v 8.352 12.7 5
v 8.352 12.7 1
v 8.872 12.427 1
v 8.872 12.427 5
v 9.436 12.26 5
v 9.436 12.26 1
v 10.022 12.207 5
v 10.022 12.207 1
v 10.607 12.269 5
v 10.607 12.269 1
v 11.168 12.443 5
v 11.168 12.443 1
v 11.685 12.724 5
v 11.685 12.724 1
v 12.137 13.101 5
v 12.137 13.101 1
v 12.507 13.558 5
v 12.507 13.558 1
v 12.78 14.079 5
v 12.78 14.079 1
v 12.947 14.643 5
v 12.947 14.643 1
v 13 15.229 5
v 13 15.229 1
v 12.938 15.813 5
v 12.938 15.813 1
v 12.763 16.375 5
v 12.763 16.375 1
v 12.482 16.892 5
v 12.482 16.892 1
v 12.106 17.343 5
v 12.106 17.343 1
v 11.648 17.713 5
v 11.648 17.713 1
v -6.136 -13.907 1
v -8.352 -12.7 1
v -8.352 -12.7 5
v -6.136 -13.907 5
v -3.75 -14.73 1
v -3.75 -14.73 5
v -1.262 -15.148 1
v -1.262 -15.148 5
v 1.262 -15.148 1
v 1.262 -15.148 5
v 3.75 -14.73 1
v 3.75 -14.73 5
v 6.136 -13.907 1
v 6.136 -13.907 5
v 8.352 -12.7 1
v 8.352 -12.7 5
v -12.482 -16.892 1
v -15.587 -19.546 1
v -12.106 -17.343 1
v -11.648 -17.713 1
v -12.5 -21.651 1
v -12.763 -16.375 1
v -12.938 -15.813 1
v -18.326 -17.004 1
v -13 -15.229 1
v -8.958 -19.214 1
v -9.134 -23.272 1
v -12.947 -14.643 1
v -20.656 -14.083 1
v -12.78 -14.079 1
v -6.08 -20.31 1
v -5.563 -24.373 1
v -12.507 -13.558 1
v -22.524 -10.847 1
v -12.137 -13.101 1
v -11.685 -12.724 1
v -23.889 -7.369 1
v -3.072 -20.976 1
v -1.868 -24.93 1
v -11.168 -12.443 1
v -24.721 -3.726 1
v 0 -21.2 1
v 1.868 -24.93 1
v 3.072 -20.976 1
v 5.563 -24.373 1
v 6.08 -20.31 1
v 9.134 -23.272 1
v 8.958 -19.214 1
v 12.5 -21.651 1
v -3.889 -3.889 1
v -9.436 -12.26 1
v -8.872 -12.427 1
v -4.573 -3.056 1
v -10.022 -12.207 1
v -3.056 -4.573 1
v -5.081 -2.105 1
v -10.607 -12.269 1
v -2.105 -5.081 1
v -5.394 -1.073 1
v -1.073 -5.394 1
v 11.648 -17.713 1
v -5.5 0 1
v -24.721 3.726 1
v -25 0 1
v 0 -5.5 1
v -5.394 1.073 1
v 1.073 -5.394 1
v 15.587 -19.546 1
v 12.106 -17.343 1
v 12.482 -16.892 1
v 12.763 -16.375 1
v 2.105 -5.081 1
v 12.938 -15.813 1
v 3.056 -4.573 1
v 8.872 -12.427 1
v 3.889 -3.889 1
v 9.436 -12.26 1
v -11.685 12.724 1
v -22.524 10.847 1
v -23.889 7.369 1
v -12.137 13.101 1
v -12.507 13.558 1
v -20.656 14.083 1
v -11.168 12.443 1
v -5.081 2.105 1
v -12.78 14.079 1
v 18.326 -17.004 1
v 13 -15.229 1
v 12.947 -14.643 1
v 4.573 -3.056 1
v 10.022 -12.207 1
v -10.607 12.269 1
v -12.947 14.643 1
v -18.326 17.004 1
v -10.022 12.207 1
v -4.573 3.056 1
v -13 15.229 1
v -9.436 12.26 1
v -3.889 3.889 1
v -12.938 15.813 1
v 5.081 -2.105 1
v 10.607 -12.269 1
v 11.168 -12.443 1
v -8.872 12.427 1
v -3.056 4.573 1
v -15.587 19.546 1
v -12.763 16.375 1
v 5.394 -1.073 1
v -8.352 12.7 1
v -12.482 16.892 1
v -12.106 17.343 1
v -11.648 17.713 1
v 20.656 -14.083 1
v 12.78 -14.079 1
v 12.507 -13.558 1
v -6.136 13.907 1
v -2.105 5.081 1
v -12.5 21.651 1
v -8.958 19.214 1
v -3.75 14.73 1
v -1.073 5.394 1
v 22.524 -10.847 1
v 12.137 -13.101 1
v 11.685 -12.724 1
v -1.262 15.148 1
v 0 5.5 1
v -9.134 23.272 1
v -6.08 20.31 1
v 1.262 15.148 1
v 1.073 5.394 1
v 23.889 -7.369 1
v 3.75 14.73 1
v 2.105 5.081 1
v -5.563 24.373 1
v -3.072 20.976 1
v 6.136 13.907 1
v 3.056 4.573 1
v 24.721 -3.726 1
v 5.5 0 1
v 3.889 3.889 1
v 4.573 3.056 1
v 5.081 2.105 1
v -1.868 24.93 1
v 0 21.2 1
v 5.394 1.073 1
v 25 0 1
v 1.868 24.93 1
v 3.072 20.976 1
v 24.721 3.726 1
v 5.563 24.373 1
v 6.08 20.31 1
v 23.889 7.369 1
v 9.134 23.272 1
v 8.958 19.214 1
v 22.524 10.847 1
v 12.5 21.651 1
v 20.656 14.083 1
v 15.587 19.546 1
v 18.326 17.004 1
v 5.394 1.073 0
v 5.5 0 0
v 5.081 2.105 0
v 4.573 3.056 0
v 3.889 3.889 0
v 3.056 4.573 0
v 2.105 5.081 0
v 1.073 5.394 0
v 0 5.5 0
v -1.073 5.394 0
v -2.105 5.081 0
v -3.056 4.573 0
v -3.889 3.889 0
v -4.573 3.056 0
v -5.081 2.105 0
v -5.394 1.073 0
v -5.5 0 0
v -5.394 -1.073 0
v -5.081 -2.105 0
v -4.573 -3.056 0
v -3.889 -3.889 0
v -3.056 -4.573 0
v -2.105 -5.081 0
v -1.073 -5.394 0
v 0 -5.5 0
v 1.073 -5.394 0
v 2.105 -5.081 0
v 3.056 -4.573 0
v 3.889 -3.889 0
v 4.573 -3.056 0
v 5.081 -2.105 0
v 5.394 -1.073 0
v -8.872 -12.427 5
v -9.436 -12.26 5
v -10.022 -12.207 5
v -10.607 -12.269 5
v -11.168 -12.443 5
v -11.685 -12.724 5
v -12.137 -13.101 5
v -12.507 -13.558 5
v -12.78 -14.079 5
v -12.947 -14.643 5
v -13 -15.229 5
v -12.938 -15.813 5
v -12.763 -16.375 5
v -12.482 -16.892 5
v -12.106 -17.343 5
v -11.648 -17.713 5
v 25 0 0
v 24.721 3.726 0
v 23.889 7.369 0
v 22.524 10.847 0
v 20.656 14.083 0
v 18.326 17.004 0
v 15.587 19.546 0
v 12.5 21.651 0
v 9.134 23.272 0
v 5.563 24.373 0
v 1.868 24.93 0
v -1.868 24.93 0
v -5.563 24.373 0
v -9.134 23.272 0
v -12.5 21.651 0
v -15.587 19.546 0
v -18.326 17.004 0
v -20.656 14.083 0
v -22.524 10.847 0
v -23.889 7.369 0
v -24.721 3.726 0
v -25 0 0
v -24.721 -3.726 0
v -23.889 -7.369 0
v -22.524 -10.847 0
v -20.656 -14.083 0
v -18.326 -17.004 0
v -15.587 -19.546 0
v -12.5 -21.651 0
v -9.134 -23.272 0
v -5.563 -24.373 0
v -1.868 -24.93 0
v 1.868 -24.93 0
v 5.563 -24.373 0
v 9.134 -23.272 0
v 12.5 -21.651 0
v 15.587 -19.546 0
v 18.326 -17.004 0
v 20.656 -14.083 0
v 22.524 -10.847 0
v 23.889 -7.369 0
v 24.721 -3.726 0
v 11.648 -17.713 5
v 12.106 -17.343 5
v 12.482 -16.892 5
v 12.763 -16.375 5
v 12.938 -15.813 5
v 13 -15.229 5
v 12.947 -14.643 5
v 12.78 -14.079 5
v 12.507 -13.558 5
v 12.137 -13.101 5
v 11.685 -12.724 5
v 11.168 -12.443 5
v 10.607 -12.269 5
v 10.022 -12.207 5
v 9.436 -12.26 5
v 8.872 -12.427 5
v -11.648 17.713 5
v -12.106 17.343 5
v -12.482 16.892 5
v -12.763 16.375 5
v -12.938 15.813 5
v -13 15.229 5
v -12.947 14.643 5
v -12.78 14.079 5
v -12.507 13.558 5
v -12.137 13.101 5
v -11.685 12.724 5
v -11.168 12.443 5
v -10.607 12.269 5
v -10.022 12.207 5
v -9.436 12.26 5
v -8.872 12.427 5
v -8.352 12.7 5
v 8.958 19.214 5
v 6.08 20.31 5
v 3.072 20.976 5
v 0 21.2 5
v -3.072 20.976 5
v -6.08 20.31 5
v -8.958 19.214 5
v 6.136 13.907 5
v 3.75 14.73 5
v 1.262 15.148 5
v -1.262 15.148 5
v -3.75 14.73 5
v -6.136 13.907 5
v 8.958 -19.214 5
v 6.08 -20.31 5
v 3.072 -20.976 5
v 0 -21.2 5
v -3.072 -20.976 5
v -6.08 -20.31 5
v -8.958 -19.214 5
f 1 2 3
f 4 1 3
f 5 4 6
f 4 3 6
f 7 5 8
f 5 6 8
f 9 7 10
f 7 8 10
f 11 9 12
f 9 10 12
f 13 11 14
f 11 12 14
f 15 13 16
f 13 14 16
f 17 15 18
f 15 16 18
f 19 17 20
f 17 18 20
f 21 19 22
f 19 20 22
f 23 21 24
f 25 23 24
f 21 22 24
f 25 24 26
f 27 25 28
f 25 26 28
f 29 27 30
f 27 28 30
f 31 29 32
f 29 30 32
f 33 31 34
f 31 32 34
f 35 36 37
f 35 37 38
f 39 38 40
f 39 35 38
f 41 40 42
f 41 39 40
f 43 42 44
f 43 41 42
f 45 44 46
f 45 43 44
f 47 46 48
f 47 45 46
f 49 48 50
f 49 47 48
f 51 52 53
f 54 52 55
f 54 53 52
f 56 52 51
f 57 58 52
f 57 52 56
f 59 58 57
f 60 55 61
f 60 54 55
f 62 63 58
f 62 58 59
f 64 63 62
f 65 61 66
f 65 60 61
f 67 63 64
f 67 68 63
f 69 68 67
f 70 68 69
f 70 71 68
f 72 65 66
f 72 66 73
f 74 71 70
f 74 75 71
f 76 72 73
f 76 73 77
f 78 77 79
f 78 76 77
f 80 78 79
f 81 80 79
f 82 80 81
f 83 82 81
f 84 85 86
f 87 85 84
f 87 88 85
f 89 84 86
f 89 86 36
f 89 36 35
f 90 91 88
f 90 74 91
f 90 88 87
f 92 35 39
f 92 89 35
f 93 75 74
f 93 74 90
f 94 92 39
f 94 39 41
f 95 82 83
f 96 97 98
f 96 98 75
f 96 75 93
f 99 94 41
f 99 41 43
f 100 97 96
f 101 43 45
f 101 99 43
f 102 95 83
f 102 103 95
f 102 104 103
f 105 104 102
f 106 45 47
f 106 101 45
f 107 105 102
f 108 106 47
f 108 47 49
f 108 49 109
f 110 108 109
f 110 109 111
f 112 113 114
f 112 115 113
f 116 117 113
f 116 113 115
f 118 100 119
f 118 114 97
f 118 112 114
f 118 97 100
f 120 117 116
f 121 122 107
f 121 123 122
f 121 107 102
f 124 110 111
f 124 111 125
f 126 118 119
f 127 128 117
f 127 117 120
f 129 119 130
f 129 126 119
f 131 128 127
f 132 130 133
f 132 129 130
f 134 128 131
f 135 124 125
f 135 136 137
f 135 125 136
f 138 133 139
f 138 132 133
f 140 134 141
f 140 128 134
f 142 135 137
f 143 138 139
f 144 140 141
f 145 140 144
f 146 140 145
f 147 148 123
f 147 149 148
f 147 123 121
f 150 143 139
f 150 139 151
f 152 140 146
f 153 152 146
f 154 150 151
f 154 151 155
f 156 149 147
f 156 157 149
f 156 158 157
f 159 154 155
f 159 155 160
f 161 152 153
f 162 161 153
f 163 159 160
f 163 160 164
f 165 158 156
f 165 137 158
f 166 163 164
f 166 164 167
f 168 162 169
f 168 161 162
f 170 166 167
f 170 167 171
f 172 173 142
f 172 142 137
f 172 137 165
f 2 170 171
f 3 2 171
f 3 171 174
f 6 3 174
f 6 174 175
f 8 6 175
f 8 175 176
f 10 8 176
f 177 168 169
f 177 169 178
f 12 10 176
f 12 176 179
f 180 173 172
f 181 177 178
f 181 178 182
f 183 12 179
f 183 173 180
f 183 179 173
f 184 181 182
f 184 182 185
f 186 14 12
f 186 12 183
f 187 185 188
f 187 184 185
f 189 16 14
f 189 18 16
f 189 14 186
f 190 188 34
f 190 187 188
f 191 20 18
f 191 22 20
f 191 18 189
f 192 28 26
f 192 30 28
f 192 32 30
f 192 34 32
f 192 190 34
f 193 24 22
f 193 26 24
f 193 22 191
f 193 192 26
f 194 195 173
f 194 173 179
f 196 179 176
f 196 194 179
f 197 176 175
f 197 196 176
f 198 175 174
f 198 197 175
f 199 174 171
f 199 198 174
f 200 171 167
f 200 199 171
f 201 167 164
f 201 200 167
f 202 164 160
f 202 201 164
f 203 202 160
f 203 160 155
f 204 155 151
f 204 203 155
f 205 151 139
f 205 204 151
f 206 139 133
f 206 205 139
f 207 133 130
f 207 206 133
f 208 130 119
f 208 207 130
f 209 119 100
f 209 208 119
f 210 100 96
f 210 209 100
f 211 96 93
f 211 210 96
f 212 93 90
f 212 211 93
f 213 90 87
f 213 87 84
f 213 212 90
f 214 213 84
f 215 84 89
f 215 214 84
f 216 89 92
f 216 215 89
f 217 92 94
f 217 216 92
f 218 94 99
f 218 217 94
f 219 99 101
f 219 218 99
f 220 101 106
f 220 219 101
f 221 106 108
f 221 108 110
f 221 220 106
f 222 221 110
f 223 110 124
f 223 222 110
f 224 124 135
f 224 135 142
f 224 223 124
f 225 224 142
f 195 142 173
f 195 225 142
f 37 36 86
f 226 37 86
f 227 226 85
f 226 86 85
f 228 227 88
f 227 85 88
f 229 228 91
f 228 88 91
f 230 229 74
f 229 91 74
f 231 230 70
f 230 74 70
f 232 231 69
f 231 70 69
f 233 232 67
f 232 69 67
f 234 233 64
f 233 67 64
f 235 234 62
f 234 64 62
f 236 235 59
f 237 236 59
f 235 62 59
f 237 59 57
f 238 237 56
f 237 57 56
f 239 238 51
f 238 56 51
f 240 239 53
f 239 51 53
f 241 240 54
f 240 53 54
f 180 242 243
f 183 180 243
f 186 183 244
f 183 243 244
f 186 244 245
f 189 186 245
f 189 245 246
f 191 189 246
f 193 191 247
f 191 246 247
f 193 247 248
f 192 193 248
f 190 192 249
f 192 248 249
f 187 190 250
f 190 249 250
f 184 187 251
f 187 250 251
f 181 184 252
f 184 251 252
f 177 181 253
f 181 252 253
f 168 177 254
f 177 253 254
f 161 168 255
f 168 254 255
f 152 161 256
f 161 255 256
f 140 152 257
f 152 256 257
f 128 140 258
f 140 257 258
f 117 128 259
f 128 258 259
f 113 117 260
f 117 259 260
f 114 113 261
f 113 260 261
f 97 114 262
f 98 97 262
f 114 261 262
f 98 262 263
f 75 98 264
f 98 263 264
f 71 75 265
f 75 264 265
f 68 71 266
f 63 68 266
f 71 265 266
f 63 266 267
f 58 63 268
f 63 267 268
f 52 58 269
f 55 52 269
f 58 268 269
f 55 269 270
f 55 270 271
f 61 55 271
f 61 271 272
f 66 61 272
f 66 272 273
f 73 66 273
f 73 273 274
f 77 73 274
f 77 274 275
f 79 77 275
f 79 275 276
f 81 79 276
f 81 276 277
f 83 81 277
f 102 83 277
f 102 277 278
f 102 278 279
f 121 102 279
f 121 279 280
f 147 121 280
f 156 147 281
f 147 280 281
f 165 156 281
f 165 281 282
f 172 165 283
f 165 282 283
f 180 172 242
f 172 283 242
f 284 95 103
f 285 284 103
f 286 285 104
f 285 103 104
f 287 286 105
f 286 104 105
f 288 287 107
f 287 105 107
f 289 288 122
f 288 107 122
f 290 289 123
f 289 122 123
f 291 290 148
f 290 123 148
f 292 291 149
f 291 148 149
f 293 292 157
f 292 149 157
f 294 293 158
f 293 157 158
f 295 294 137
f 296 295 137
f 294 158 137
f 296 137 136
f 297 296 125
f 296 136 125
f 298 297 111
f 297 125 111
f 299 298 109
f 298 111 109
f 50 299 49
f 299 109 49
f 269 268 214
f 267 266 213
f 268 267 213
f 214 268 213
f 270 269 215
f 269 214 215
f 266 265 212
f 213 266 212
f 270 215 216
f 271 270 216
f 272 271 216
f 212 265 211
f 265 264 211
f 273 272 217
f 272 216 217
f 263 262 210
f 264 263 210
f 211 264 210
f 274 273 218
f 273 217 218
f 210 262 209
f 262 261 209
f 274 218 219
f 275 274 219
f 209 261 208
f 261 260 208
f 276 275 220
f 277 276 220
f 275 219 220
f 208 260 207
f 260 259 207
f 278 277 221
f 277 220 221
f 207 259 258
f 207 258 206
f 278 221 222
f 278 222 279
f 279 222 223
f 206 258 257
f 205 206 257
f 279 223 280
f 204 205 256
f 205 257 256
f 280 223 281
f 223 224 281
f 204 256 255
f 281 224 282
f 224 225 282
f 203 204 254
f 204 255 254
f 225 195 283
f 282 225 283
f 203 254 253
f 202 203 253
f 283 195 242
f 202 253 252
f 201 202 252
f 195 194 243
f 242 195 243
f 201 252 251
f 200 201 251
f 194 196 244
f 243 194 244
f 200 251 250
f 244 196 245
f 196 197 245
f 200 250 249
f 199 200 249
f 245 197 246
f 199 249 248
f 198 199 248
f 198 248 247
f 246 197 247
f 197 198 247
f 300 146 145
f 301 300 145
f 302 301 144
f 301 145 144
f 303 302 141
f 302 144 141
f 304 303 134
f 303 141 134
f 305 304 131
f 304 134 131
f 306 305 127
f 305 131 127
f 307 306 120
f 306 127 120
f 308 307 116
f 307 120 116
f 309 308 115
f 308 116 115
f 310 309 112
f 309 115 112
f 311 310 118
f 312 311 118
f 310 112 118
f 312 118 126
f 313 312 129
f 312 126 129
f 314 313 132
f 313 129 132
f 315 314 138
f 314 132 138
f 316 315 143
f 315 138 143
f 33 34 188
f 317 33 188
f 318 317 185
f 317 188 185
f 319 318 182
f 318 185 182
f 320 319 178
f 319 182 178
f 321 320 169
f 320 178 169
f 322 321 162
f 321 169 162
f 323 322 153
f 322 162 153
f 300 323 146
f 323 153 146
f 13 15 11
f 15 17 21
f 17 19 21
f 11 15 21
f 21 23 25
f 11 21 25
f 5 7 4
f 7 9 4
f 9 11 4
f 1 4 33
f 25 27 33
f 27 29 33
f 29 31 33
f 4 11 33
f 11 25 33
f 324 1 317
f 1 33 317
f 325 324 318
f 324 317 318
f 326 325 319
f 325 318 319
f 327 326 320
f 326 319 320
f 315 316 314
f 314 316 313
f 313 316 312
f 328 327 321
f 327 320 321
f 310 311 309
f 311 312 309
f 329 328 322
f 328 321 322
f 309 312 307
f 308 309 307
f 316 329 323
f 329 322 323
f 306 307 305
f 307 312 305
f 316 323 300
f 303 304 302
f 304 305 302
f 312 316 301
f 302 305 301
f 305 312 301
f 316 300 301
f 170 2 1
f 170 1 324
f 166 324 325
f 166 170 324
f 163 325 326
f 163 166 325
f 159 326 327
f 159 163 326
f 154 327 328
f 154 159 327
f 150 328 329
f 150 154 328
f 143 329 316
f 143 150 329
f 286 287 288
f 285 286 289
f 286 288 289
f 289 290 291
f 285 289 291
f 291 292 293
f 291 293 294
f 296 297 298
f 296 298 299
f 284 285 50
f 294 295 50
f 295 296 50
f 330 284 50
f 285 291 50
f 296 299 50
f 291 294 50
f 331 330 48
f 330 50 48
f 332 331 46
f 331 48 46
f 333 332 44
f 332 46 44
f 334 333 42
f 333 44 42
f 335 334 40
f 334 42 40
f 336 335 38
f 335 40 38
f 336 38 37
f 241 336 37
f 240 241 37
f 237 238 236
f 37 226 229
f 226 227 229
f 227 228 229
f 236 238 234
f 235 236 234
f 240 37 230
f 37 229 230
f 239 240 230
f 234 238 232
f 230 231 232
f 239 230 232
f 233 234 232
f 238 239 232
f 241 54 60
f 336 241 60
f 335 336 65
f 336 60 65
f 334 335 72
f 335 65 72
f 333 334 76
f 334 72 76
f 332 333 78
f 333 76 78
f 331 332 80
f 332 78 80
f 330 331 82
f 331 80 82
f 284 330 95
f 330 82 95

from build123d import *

# Parameters (mm, degrees)
SKETCH002_R   = 25
SKETCH002_R_2 = 5.5
PAD_DEPTH     = 1
PAD001_DEPTH  = 4


with BuildPart() as part:
    # Sketch002 → Pad (new body)
    with BuildSketch(Plane.XY):
        Circle(SKETCH002_R)
        Circle(SKETCH002_R_2, mode=Mode.SUBTRACT)
    extrude(amount=PAD_DEPTH)

    # Sketch001 → Pad001 (join)
    with BuildSketch(Plane.XY.offset(1)):
        with BuildLine():
            ThreePointArc((8.351648, 12.699999), (0, 15.2), (-8.351648, 12.699999))
            ThreePointArc((-11.648352, 17.713156), (-12.506579, 13.558226), (-8.351648, 12.699999))
            ThreePointArc((11.648352, 17.713156), (0, 21.2), (-11.648352, 17.713156))
            ThreePointArc((8.351648, 12.699999), (12.506579, 13.558226), (11.648352, 17.713156))
        make_face()
        with BuildLine():
            ThreePointArc((-8.351648, -12.699999), (0, -15.2), (8.351648, -12.699999))
            ThreePointArc((11.648352, -17.713156), (12.506579, -13.558226), (8.351648, -12.699999))
            ThreePointArc((-11.648352, -17.713156), (0, -21.2), (11.648352, -17.713156))
            ThreePointArc((-8.351648, -12.699999), (-12.506579, -13.558226), (-11.648352, -17.713156))
        make_face()
    extrude(amount=PAD001_DEPTH)


solid = part.part
